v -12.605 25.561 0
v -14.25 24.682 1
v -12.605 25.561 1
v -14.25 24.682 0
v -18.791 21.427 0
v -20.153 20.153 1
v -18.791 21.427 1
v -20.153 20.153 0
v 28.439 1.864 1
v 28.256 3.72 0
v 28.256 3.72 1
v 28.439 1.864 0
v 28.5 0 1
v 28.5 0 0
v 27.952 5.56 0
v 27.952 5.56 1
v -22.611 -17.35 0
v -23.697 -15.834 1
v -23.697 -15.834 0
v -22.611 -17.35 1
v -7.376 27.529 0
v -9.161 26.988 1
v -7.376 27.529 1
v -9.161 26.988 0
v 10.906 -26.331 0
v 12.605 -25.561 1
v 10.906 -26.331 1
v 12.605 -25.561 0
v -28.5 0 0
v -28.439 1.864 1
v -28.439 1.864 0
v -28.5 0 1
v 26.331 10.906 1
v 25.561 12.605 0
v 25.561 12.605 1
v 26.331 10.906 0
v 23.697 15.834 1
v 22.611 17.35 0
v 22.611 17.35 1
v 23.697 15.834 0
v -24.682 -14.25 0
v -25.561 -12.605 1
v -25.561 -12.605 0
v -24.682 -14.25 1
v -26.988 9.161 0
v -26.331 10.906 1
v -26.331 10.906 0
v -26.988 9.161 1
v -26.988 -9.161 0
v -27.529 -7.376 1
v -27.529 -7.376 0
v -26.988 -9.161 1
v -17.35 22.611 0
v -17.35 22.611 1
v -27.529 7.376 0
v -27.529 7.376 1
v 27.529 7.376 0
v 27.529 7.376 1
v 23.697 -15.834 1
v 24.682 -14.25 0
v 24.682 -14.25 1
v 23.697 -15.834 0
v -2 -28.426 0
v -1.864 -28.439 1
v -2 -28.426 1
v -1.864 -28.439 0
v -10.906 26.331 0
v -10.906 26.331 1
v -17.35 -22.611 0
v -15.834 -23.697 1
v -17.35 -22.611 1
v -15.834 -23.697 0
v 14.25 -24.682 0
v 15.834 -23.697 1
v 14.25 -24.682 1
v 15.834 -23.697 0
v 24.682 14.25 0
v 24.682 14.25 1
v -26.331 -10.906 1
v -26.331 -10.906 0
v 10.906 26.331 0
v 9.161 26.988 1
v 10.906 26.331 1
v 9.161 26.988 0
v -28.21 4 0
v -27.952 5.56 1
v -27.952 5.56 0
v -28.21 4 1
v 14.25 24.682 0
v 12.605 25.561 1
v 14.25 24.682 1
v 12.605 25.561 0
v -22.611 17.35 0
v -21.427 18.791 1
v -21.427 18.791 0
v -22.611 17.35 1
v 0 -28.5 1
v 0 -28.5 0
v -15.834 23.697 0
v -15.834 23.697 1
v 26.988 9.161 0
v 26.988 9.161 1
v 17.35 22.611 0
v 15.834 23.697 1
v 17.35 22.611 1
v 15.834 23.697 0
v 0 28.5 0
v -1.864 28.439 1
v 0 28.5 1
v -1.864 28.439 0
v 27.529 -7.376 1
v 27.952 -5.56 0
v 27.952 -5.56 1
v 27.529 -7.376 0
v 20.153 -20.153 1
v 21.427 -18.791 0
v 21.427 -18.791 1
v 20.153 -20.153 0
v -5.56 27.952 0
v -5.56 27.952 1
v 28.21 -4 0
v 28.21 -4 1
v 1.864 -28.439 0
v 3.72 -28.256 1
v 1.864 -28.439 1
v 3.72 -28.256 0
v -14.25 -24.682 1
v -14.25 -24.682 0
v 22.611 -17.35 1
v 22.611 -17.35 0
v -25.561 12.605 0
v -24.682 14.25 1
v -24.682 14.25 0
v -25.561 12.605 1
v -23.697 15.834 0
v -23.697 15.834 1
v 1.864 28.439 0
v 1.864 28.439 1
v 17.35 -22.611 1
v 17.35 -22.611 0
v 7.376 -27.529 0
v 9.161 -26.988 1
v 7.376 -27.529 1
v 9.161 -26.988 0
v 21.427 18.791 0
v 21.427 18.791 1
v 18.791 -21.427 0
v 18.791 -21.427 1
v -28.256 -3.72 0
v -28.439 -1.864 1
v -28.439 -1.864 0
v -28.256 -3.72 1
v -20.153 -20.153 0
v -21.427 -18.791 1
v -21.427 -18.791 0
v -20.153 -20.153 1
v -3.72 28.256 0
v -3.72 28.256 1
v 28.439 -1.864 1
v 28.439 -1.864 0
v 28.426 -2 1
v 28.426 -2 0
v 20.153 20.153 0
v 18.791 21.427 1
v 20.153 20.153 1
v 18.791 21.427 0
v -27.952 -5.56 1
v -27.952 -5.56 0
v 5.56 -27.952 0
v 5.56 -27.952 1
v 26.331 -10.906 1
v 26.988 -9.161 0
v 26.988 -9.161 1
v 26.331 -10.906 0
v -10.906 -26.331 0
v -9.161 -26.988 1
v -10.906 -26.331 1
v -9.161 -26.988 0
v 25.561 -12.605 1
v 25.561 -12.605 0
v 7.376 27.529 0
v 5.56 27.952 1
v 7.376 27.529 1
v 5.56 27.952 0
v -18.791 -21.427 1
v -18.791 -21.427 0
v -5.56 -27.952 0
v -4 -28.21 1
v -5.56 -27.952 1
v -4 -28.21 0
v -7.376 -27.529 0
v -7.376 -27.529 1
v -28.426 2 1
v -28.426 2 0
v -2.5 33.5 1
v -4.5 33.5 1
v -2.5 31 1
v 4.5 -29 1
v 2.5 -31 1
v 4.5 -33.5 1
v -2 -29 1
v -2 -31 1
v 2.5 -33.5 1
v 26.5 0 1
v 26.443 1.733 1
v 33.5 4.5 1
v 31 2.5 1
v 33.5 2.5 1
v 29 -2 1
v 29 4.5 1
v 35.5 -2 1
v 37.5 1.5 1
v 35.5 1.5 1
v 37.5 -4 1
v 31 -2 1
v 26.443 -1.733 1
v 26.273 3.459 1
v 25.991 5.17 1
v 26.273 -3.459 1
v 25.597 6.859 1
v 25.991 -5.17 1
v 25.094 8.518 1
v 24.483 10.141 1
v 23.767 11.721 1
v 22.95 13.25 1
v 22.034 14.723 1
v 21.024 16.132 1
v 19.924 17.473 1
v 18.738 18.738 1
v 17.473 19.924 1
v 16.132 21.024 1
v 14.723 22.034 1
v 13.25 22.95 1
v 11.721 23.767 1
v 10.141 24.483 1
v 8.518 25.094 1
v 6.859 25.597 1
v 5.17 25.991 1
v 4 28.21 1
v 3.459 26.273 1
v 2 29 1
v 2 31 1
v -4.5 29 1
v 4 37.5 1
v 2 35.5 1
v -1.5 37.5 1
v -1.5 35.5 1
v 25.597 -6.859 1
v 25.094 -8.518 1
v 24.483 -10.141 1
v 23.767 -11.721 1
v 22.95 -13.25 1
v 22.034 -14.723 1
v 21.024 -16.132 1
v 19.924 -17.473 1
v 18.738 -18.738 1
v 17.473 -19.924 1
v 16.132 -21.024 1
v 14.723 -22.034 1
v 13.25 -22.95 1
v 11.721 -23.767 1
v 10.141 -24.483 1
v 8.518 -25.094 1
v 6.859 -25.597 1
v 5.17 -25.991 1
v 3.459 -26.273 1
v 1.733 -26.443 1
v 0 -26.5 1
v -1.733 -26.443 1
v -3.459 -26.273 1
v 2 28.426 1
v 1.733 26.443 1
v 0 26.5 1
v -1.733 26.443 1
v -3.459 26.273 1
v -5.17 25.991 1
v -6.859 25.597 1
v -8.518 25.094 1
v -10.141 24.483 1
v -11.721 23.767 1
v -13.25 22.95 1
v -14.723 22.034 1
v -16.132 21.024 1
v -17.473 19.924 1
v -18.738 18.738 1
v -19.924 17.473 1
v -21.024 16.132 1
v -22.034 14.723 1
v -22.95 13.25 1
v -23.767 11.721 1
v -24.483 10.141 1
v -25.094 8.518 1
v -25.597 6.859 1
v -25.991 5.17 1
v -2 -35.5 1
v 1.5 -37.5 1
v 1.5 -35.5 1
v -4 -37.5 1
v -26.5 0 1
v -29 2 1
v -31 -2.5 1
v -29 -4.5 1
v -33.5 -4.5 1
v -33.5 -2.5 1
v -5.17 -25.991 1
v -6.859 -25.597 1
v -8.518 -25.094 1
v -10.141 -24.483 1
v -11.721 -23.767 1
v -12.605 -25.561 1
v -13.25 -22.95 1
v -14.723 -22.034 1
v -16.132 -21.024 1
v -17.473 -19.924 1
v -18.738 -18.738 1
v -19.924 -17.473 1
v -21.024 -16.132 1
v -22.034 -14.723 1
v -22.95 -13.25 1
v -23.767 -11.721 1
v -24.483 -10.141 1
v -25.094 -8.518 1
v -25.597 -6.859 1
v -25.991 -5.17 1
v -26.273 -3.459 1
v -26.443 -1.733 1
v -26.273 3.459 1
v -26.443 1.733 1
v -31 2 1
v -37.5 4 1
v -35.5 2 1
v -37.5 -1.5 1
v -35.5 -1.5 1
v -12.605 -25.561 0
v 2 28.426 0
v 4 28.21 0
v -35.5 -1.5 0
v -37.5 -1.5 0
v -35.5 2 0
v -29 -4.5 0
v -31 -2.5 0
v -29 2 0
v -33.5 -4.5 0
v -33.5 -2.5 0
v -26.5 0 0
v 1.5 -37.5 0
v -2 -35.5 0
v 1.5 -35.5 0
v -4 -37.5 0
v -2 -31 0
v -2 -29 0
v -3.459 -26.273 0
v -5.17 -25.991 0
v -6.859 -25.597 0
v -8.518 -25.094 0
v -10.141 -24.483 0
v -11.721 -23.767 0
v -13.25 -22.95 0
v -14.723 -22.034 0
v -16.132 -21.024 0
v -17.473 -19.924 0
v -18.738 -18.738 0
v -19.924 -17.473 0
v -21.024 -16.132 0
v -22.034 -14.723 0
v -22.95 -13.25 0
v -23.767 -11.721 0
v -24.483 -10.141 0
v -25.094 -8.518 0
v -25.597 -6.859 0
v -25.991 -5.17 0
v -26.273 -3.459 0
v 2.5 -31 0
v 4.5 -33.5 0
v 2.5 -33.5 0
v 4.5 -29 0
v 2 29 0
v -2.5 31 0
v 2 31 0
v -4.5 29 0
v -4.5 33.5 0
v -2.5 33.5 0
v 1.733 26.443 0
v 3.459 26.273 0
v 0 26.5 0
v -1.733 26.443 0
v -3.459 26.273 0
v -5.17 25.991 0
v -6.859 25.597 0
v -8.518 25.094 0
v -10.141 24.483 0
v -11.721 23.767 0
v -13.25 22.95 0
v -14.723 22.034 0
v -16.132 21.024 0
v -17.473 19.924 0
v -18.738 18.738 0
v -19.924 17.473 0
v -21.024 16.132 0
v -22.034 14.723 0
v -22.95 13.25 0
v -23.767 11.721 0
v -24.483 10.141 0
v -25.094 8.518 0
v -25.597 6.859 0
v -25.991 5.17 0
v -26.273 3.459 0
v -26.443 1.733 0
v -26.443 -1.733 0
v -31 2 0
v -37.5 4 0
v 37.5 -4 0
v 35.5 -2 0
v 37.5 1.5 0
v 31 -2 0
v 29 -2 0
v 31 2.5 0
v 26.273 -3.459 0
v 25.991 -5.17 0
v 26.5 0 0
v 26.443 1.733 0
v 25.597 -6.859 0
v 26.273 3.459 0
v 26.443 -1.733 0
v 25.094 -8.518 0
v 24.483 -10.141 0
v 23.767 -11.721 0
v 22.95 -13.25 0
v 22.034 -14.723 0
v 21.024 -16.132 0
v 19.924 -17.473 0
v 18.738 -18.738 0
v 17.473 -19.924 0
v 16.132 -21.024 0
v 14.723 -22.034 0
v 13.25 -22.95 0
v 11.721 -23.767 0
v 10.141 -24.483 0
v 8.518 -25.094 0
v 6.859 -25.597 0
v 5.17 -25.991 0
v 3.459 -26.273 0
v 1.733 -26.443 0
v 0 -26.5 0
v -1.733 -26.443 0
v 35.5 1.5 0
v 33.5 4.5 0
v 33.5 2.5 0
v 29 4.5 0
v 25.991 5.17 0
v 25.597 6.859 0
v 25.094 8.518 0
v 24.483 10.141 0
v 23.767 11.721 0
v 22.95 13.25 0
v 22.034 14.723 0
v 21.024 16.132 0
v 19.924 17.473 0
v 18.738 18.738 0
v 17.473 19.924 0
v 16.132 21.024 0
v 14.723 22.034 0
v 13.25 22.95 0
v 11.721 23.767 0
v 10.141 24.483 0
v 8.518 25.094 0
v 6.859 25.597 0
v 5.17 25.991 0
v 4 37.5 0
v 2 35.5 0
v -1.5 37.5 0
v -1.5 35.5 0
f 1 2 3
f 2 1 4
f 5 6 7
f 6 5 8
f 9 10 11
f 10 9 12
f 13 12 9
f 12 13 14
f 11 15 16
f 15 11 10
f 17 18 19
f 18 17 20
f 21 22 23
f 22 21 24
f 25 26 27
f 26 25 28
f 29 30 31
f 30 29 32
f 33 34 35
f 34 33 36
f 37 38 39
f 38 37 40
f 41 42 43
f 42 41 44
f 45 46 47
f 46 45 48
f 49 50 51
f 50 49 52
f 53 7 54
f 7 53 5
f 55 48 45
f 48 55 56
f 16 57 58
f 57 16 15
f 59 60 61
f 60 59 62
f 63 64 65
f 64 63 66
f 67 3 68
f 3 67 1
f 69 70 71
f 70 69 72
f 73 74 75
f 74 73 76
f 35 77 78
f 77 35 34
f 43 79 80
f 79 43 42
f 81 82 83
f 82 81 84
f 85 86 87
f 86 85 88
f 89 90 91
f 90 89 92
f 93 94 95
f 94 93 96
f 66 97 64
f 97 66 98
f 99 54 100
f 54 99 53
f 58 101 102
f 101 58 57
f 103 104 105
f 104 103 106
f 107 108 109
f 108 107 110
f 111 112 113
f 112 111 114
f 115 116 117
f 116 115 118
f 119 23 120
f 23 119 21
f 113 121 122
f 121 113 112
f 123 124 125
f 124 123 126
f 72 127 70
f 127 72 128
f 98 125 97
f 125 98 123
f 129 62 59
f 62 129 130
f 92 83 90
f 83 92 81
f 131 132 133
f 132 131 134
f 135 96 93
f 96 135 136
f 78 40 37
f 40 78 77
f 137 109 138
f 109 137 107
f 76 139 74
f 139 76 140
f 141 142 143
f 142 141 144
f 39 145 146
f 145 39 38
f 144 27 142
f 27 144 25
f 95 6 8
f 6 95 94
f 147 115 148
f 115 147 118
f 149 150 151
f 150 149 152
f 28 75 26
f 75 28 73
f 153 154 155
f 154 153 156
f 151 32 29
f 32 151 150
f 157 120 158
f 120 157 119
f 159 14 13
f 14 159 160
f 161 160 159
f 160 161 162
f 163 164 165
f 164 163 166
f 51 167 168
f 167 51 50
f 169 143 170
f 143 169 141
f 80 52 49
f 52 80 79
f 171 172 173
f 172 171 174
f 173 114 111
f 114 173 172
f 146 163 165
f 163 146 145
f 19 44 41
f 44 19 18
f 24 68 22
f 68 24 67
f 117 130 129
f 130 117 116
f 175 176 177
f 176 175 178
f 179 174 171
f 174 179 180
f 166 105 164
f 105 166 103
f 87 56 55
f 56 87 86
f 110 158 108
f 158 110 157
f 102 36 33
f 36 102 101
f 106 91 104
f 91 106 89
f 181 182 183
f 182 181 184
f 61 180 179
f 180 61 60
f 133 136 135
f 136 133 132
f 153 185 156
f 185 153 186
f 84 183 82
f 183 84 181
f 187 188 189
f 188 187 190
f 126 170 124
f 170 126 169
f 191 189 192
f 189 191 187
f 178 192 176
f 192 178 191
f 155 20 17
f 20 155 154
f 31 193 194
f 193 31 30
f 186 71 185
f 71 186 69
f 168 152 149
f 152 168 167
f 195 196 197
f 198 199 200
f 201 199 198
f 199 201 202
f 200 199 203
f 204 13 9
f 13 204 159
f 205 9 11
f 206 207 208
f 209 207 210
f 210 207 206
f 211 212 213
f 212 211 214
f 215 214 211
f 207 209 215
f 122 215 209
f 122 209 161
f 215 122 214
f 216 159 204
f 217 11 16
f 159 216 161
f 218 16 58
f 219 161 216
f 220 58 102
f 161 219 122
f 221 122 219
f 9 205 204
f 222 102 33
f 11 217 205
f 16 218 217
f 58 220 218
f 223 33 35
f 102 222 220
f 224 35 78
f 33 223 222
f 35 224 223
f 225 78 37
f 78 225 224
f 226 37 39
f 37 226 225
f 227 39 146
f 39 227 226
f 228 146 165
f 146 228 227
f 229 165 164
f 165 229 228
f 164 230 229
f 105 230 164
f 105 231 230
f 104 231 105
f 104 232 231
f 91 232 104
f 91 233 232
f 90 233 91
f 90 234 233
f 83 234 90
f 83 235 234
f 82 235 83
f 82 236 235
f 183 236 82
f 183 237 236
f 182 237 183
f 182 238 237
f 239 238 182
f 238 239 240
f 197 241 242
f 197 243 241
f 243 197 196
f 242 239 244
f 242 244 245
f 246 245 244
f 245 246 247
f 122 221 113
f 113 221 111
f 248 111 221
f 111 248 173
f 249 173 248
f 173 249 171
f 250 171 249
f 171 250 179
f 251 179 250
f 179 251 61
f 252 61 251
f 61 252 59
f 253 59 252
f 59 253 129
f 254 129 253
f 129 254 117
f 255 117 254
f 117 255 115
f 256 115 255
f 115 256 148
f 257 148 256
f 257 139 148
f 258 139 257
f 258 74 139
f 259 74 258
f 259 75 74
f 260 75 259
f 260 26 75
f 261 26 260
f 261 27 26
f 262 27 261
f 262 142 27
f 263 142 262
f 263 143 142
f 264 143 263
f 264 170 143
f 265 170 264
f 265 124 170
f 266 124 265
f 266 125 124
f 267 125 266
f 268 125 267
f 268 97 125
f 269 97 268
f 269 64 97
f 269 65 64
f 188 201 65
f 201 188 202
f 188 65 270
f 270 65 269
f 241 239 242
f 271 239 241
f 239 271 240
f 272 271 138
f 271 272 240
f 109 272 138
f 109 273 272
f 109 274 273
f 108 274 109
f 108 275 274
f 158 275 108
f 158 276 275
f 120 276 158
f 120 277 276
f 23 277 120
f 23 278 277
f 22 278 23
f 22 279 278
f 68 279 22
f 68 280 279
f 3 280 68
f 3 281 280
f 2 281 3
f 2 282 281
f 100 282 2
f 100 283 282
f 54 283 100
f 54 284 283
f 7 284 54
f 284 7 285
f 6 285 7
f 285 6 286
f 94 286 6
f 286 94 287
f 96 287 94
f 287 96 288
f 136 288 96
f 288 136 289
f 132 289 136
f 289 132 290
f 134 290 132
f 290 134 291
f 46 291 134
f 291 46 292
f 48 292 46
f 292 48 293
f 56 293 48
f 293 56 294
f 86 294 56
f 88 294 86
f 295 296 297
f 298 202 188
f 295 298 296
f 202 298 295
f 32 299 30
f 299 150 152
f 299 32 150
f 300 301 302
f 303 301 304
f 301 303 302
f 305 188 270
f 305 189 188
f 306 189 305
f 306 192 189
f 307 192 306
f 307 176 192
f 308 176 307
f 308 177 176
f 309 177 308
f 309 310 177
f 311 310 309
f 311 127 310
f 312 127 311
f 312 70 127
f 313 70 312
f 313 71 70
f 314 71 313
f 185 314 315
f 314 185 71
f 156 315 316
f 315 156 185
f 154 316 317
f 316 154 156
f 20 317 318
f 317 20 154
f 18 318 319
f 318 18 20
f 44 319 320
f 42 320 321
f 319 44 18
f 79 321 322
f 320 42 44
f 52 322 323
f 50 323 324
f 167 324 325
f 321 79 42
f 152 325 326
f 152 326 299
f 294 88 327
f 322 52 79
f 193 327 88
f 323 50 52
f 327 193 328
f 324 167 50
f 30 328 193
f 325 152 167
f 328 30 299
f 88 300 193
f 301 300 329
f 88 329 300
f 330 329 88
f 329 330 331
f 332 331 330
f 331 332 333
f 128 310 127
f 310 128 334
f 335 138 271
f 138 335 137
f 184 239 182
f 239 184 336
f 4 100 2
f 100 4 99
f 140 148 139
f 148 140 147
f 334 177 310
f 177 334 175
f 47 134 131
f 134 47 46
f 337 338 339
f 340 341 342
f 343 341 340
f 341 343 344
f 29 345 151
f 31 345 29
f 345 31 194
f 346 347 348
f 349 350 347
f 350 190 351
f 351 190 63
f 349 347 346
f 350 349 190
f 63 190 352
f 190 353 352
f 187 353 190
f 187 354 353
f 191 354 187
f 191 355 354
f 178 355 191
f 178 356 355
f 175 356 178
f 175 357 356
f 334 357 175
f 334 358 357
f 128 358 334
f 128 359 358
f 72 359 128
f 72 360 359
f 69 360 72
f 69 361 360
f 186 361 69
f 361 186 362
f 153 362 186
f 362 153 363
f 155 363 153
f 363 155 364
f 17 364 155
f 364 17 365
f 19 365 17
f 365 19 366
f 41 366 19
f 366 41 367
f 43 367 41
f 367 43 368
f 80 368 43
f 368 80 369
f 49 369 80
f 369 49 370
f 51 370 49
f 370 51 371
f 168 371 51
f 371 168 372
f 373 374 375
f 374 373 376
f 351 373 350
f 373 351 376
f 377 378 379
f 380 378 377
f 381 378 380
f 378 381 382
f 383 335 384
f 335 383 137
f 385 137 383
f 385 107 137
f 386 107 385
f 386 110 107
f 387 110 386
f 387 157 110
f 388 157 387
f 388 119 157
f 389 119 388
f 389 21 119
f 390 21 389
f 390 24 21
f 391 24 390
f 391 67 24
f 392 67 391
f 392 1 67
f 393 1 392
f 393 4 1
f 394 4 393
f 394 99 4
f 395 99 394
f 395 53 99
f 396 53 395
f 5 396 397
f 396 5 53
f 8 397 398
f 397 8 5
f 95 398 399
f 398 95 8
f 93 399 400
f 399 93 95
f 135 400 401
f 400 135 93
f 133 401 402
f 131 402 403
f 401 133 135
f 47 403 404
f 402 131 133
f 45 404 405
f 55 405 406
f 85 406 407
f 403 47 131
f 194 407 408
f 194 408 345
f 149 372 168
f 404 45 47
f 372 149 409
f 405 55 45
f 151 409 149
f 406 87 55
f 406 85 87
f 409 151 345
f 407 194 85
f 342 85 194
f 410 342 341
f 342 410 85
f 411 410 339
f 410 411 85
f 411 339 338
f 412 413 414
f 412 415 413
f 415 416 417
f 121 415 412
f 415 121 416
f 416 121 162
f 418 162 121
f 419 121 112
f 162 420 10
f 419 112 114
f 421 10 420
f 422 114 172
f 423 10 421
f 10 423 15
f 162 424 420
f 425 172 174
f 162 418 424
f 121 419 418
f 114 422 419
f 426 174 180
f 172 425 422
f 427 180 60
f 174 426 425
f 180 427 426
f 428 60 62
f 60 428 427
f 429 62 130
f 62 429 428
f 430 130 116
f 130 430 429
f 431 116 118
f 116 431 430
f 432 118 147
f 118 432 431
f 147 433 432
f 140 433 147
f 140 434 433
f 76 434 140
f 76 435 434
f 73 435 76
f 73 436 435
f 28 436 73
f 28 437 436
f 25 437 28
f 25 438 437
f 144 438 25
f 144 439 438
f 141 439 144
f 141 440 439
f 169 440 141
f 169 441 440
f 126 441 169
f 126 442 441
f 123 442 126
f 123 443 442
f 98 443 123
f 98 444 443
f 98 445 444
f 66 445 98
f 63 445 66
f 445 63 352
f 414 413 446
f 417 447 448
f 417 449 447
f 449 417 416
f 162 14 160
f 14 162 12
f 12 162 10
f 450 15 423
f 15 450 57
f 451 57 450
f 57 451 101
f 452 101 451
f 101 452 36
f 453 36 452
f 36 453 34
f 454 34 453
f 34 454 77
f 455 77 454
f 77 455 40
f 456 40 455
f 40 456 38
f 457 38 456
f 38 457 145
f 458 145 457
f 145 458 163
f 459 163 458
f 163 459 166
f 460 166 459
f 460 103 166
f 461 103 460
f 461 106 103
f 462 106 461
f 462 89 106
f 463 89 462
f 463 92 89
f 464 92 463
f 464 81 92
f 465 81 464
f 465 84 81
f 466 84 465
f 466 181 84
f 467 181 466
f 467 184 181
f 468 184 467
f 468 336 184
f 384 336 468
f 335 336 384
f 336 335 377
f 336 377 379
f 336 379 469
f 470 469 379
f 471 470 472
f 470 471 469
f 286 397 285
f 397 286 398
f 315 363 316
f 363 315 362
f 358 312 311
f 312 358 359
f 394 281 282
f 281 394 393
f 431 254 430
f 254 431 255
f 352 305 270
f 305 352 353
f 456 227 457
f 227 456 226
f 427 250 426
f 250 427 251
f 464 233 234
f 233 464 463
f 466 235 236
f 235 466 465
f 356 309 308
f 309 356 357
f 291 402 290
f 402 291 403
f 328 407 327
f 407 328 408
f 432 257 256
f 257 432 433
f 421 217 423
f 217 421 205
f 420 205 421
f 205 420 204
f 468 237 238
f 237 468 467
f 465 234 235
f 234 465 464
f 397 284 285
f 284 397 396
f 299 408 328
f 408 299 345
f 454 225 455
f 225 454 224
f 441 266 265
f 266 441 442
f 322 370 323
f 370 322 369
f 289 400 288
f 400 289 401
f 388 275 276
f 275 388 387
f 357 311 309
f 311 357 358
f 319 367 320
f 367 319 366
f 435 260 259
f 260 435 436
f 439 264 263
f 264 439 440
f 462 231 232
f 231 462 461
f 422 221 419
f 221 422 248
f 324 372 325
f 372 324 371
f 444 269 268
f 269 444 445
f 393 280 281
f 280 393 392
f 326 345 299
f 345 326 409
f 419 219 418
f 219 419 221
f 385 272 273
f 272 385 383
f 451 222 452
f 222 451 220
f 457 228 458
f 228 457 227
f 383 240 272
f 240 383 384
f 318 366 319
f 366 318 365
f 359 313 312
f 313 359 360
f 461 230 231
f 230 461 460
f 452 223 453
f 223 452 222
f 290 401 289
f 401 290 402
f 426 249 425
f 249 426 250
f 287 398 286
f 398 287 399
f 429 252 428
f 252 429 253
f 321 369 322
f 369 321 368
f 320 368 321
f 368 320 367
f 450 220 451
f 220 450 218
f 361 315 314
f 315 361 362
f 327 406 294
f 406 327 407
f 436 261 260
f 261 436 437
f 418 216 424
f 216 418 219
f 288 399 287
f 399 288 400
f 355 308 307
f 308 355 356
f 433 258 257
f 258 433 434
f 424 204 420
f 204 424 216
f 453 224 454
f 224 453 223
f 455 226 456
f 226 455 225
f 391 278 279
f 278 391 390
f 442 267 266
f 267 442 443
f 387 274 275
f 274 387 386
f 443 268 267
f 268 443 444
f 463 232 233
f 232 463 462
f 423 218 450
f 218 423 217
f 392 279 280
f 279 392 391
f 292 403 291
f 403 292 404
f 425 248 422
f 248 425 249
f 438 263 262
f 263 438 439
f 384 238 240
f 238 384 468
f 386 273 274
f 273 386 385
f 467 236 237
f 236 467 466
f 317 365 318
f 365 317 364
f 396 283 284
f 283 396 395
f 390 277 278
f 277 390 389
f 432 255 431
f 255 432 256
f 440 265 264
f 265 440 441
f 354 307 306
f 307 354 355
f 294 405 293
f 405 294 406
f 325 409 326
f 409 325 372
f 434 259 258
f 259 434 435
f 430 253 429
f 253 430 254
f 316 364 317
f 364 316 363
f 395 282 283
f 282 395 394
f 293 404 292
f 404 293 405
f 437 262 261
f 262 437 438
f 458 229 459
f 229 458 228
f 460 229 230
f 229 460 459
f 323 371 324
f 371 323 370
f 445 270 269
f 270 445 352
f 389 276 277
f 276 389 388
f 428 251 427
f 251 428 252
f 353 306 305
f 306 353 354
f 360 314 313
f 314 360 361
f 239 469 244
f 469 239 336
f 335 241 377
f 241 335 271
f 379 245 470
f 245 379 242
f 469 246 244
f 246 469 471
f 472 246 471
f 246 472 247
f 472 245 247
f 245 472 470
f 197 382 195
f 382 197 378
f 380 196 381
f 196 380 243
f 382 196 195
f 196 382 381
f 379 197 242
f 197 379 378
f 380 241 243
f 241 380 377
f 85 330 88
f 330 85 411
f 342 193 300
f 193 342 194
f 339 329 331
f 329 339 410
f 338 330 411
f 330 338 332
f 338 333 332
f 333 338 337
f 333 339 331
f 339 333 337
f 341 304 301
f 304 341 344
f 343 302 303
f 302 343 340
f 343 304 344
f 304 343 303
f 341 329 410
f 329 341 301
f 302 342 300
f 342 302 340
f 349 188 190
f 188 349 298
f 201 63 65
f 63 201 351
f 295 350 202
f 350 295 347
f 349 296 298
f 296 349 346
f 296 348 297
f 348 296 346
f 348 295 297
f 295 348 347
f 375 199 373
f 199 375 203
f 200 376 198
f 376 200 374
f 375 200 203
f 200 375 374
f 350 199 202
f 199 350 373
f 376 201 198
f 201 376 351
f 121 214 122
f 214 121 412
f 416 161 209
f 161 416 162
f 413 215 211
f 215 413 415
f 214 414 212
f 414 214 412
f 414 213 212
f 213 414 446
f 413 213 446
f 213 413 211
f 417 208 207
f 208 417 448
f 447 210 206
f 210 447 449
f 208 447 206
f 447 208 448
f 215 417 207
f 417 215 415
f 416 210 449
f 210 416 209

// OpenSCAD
stabilizer();

$fn = 96;
height = 1;
trace = 1.0;

arbor = 53; // Replicator, etc. = 53, Monoprice = 31;
gap	= 4;
//coreR = 34.25; 	// New
coreR = 33; 	// Old
lip = 2.5;
tabH = coreR+lip+2;
tabL = gap-0.5;

module stabilizer()
{
difference(){
	cylinder(height, arbor/2+2*trace, arbor/2+2*trace);
	cylinder(height, arbor/2, arbor/2);
	}
for(i=[0:3])
	{
	rotate([0,0,i*90]) union(){
	translate([gap/2,arbor/2+trace/2,0]) cube([trace*2, tabH-arbor/2-trace/2,height]);
	translate([gap/2 - tabL,tabH-2*trace,0]) cube([tabL+2*trace,2*trace,height]);
	translate([-gap/2-2*trace-0.5, coreR - 2*trace, 0]) cube([2*trace,lip,height]);
	translate([-gap/2-0.5-2*trace,coreR-2*trace-2*trace,0]) cube([gap+2*trace+0.5+2*trace,2*trace,height]);
		}
	}
}
